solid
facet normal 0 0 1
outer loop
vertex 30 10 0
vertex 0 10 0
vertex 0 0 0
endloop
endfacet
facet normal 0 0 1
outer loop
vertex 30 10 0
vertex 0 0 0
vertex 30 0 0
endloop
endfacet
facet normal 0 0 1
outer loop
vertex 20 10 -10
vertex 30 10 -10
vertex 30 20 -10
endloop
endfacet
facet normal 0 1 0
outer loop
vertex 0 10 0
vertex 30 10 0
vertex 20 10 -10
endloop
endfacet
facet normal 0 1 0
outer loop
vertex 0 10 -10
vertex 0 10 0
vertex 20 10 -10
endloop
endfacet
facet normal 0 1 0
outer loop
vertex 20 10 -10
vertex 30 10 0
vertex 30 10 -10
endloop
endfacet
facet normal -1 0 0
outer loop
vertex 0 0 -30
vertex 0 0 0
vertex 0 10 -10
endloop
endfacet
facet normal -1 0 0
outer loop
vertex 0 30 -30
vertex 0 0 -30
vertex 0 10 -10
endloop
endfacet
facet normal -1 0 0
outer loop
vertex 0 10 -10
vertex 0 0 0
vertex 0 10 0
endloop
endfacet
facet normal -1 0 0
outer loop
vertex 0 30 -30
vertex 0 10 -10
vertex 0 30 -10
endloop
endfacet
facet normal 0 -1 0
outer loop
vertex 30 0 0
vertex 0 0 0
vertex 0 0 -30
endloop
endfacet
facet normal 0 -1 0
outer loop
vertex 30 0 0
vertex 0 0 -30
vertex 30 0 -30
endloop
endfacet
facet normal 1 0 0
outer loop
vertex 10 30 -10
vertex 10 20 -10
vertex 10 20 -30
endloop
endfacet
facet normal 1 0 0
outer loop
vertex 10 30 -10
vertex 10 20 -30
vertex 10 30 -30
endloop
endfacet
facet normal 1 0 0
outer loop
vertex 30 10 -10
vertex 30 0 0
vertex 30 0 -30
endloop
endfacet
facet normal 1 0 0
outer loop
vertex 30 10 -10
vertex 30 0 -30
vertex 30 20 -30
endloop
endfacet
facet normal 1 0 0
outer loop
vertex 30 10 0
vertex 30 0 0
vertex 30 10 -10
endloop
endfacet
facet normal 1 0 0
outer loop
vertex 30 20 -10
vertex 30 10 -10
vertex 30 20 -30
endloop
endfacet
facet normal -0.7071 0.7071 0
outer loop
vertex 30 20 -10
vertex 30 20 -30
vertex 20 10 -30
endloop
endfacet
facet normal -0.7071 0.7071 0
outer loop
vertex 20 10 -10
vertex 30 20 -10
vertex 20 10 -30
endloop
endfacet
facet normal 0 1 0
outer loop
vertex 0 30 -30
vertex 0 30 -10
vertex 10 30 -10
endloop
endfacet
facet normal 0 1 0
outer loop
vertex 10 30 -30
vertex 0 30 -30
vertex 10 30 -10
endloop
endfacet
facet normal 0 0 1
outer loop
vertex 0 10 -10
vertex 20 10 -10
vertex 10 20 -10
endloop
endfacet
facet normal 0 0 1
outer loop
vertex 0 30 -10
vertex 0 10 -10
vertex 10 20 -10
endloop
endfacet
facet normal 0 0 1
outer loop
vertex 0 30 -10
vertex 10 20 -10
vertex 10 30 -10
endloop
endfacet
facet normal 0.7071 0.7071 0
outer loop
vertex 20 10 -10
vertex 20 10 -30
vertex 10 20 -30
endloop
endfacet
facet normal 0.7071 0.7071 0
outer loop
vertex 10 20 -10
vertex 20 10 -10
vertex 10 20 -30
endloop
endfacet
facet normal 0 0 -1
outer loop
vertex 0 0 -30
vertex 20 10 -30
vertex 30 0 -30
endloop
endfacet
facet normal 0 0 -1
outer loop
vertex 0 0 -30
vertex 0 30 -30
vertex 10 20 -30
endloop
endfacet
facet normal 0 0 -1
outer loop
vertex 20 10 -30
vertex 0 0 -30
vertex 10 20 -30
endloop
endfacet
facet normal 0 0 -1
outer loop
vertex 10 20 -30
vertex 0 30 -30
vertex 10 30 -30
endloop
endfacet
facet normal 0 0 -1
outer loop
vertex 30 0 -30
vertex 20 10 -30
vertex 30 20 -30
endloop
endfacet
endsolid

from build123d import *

# Parameters (mm, degrees)
SKETCH_1_W           = 30
SKETCH_1_H           = 30
EXTRUDE_1_DEPTH      = 30
SKETCH_28_W          = 20
SKETCH_28_H          = 10
CUT_EXTRUDE_18_DEPTH = 52.961524227
SKETCH_29_W          = 10
SKETCH_29_H          = 10
CUT_EXTRUDE_19_DEPTH = 52.961524227


with BuildPart() as part:
    # 草圖1 → 填料-伸1 (new body)
    with BuildSketch(Plane.XY):
        with Locations((15, 15)):
            Rectangle(SKETCH_1_W, SKETCH_1_H)
    extrude(amount=-EXTRUDE_1_DEPTH)

    # 草圖28 → 除料-伸長18 (cut, through all)
    with BuildSketch(Plane.XY):
        with Locations((20, 25)):
            Rectangle(SKETCH_28_W, SKETCH_28_H)
        Polygon((10, 20), (30, 20), (20, 10), align=None)
    extrude(amount=-CUT_EXTRUDE_18_DEPTH, mode=Mode.SUBTRACT)

    # 草圖29 → 除料-伸長19 (cut, through all)
    with BuildSketch(Plane(origin=(30, 0, 0), x_dir=(0, 0, -1), z_dir=(1, 0, 0))):
        with Locations((5, 25)):
            Rectangle(SKETCH_29_W, SKETCH_29_H)
        with Locations((5, 15)):
            Rectangle(SKETCH_29_W, SKETCH_29_H)
    extrude(amount=-CUT_EXTRUDE_19_DEPTH, mode=Mode.SUBTRACT)


solid = part.part
